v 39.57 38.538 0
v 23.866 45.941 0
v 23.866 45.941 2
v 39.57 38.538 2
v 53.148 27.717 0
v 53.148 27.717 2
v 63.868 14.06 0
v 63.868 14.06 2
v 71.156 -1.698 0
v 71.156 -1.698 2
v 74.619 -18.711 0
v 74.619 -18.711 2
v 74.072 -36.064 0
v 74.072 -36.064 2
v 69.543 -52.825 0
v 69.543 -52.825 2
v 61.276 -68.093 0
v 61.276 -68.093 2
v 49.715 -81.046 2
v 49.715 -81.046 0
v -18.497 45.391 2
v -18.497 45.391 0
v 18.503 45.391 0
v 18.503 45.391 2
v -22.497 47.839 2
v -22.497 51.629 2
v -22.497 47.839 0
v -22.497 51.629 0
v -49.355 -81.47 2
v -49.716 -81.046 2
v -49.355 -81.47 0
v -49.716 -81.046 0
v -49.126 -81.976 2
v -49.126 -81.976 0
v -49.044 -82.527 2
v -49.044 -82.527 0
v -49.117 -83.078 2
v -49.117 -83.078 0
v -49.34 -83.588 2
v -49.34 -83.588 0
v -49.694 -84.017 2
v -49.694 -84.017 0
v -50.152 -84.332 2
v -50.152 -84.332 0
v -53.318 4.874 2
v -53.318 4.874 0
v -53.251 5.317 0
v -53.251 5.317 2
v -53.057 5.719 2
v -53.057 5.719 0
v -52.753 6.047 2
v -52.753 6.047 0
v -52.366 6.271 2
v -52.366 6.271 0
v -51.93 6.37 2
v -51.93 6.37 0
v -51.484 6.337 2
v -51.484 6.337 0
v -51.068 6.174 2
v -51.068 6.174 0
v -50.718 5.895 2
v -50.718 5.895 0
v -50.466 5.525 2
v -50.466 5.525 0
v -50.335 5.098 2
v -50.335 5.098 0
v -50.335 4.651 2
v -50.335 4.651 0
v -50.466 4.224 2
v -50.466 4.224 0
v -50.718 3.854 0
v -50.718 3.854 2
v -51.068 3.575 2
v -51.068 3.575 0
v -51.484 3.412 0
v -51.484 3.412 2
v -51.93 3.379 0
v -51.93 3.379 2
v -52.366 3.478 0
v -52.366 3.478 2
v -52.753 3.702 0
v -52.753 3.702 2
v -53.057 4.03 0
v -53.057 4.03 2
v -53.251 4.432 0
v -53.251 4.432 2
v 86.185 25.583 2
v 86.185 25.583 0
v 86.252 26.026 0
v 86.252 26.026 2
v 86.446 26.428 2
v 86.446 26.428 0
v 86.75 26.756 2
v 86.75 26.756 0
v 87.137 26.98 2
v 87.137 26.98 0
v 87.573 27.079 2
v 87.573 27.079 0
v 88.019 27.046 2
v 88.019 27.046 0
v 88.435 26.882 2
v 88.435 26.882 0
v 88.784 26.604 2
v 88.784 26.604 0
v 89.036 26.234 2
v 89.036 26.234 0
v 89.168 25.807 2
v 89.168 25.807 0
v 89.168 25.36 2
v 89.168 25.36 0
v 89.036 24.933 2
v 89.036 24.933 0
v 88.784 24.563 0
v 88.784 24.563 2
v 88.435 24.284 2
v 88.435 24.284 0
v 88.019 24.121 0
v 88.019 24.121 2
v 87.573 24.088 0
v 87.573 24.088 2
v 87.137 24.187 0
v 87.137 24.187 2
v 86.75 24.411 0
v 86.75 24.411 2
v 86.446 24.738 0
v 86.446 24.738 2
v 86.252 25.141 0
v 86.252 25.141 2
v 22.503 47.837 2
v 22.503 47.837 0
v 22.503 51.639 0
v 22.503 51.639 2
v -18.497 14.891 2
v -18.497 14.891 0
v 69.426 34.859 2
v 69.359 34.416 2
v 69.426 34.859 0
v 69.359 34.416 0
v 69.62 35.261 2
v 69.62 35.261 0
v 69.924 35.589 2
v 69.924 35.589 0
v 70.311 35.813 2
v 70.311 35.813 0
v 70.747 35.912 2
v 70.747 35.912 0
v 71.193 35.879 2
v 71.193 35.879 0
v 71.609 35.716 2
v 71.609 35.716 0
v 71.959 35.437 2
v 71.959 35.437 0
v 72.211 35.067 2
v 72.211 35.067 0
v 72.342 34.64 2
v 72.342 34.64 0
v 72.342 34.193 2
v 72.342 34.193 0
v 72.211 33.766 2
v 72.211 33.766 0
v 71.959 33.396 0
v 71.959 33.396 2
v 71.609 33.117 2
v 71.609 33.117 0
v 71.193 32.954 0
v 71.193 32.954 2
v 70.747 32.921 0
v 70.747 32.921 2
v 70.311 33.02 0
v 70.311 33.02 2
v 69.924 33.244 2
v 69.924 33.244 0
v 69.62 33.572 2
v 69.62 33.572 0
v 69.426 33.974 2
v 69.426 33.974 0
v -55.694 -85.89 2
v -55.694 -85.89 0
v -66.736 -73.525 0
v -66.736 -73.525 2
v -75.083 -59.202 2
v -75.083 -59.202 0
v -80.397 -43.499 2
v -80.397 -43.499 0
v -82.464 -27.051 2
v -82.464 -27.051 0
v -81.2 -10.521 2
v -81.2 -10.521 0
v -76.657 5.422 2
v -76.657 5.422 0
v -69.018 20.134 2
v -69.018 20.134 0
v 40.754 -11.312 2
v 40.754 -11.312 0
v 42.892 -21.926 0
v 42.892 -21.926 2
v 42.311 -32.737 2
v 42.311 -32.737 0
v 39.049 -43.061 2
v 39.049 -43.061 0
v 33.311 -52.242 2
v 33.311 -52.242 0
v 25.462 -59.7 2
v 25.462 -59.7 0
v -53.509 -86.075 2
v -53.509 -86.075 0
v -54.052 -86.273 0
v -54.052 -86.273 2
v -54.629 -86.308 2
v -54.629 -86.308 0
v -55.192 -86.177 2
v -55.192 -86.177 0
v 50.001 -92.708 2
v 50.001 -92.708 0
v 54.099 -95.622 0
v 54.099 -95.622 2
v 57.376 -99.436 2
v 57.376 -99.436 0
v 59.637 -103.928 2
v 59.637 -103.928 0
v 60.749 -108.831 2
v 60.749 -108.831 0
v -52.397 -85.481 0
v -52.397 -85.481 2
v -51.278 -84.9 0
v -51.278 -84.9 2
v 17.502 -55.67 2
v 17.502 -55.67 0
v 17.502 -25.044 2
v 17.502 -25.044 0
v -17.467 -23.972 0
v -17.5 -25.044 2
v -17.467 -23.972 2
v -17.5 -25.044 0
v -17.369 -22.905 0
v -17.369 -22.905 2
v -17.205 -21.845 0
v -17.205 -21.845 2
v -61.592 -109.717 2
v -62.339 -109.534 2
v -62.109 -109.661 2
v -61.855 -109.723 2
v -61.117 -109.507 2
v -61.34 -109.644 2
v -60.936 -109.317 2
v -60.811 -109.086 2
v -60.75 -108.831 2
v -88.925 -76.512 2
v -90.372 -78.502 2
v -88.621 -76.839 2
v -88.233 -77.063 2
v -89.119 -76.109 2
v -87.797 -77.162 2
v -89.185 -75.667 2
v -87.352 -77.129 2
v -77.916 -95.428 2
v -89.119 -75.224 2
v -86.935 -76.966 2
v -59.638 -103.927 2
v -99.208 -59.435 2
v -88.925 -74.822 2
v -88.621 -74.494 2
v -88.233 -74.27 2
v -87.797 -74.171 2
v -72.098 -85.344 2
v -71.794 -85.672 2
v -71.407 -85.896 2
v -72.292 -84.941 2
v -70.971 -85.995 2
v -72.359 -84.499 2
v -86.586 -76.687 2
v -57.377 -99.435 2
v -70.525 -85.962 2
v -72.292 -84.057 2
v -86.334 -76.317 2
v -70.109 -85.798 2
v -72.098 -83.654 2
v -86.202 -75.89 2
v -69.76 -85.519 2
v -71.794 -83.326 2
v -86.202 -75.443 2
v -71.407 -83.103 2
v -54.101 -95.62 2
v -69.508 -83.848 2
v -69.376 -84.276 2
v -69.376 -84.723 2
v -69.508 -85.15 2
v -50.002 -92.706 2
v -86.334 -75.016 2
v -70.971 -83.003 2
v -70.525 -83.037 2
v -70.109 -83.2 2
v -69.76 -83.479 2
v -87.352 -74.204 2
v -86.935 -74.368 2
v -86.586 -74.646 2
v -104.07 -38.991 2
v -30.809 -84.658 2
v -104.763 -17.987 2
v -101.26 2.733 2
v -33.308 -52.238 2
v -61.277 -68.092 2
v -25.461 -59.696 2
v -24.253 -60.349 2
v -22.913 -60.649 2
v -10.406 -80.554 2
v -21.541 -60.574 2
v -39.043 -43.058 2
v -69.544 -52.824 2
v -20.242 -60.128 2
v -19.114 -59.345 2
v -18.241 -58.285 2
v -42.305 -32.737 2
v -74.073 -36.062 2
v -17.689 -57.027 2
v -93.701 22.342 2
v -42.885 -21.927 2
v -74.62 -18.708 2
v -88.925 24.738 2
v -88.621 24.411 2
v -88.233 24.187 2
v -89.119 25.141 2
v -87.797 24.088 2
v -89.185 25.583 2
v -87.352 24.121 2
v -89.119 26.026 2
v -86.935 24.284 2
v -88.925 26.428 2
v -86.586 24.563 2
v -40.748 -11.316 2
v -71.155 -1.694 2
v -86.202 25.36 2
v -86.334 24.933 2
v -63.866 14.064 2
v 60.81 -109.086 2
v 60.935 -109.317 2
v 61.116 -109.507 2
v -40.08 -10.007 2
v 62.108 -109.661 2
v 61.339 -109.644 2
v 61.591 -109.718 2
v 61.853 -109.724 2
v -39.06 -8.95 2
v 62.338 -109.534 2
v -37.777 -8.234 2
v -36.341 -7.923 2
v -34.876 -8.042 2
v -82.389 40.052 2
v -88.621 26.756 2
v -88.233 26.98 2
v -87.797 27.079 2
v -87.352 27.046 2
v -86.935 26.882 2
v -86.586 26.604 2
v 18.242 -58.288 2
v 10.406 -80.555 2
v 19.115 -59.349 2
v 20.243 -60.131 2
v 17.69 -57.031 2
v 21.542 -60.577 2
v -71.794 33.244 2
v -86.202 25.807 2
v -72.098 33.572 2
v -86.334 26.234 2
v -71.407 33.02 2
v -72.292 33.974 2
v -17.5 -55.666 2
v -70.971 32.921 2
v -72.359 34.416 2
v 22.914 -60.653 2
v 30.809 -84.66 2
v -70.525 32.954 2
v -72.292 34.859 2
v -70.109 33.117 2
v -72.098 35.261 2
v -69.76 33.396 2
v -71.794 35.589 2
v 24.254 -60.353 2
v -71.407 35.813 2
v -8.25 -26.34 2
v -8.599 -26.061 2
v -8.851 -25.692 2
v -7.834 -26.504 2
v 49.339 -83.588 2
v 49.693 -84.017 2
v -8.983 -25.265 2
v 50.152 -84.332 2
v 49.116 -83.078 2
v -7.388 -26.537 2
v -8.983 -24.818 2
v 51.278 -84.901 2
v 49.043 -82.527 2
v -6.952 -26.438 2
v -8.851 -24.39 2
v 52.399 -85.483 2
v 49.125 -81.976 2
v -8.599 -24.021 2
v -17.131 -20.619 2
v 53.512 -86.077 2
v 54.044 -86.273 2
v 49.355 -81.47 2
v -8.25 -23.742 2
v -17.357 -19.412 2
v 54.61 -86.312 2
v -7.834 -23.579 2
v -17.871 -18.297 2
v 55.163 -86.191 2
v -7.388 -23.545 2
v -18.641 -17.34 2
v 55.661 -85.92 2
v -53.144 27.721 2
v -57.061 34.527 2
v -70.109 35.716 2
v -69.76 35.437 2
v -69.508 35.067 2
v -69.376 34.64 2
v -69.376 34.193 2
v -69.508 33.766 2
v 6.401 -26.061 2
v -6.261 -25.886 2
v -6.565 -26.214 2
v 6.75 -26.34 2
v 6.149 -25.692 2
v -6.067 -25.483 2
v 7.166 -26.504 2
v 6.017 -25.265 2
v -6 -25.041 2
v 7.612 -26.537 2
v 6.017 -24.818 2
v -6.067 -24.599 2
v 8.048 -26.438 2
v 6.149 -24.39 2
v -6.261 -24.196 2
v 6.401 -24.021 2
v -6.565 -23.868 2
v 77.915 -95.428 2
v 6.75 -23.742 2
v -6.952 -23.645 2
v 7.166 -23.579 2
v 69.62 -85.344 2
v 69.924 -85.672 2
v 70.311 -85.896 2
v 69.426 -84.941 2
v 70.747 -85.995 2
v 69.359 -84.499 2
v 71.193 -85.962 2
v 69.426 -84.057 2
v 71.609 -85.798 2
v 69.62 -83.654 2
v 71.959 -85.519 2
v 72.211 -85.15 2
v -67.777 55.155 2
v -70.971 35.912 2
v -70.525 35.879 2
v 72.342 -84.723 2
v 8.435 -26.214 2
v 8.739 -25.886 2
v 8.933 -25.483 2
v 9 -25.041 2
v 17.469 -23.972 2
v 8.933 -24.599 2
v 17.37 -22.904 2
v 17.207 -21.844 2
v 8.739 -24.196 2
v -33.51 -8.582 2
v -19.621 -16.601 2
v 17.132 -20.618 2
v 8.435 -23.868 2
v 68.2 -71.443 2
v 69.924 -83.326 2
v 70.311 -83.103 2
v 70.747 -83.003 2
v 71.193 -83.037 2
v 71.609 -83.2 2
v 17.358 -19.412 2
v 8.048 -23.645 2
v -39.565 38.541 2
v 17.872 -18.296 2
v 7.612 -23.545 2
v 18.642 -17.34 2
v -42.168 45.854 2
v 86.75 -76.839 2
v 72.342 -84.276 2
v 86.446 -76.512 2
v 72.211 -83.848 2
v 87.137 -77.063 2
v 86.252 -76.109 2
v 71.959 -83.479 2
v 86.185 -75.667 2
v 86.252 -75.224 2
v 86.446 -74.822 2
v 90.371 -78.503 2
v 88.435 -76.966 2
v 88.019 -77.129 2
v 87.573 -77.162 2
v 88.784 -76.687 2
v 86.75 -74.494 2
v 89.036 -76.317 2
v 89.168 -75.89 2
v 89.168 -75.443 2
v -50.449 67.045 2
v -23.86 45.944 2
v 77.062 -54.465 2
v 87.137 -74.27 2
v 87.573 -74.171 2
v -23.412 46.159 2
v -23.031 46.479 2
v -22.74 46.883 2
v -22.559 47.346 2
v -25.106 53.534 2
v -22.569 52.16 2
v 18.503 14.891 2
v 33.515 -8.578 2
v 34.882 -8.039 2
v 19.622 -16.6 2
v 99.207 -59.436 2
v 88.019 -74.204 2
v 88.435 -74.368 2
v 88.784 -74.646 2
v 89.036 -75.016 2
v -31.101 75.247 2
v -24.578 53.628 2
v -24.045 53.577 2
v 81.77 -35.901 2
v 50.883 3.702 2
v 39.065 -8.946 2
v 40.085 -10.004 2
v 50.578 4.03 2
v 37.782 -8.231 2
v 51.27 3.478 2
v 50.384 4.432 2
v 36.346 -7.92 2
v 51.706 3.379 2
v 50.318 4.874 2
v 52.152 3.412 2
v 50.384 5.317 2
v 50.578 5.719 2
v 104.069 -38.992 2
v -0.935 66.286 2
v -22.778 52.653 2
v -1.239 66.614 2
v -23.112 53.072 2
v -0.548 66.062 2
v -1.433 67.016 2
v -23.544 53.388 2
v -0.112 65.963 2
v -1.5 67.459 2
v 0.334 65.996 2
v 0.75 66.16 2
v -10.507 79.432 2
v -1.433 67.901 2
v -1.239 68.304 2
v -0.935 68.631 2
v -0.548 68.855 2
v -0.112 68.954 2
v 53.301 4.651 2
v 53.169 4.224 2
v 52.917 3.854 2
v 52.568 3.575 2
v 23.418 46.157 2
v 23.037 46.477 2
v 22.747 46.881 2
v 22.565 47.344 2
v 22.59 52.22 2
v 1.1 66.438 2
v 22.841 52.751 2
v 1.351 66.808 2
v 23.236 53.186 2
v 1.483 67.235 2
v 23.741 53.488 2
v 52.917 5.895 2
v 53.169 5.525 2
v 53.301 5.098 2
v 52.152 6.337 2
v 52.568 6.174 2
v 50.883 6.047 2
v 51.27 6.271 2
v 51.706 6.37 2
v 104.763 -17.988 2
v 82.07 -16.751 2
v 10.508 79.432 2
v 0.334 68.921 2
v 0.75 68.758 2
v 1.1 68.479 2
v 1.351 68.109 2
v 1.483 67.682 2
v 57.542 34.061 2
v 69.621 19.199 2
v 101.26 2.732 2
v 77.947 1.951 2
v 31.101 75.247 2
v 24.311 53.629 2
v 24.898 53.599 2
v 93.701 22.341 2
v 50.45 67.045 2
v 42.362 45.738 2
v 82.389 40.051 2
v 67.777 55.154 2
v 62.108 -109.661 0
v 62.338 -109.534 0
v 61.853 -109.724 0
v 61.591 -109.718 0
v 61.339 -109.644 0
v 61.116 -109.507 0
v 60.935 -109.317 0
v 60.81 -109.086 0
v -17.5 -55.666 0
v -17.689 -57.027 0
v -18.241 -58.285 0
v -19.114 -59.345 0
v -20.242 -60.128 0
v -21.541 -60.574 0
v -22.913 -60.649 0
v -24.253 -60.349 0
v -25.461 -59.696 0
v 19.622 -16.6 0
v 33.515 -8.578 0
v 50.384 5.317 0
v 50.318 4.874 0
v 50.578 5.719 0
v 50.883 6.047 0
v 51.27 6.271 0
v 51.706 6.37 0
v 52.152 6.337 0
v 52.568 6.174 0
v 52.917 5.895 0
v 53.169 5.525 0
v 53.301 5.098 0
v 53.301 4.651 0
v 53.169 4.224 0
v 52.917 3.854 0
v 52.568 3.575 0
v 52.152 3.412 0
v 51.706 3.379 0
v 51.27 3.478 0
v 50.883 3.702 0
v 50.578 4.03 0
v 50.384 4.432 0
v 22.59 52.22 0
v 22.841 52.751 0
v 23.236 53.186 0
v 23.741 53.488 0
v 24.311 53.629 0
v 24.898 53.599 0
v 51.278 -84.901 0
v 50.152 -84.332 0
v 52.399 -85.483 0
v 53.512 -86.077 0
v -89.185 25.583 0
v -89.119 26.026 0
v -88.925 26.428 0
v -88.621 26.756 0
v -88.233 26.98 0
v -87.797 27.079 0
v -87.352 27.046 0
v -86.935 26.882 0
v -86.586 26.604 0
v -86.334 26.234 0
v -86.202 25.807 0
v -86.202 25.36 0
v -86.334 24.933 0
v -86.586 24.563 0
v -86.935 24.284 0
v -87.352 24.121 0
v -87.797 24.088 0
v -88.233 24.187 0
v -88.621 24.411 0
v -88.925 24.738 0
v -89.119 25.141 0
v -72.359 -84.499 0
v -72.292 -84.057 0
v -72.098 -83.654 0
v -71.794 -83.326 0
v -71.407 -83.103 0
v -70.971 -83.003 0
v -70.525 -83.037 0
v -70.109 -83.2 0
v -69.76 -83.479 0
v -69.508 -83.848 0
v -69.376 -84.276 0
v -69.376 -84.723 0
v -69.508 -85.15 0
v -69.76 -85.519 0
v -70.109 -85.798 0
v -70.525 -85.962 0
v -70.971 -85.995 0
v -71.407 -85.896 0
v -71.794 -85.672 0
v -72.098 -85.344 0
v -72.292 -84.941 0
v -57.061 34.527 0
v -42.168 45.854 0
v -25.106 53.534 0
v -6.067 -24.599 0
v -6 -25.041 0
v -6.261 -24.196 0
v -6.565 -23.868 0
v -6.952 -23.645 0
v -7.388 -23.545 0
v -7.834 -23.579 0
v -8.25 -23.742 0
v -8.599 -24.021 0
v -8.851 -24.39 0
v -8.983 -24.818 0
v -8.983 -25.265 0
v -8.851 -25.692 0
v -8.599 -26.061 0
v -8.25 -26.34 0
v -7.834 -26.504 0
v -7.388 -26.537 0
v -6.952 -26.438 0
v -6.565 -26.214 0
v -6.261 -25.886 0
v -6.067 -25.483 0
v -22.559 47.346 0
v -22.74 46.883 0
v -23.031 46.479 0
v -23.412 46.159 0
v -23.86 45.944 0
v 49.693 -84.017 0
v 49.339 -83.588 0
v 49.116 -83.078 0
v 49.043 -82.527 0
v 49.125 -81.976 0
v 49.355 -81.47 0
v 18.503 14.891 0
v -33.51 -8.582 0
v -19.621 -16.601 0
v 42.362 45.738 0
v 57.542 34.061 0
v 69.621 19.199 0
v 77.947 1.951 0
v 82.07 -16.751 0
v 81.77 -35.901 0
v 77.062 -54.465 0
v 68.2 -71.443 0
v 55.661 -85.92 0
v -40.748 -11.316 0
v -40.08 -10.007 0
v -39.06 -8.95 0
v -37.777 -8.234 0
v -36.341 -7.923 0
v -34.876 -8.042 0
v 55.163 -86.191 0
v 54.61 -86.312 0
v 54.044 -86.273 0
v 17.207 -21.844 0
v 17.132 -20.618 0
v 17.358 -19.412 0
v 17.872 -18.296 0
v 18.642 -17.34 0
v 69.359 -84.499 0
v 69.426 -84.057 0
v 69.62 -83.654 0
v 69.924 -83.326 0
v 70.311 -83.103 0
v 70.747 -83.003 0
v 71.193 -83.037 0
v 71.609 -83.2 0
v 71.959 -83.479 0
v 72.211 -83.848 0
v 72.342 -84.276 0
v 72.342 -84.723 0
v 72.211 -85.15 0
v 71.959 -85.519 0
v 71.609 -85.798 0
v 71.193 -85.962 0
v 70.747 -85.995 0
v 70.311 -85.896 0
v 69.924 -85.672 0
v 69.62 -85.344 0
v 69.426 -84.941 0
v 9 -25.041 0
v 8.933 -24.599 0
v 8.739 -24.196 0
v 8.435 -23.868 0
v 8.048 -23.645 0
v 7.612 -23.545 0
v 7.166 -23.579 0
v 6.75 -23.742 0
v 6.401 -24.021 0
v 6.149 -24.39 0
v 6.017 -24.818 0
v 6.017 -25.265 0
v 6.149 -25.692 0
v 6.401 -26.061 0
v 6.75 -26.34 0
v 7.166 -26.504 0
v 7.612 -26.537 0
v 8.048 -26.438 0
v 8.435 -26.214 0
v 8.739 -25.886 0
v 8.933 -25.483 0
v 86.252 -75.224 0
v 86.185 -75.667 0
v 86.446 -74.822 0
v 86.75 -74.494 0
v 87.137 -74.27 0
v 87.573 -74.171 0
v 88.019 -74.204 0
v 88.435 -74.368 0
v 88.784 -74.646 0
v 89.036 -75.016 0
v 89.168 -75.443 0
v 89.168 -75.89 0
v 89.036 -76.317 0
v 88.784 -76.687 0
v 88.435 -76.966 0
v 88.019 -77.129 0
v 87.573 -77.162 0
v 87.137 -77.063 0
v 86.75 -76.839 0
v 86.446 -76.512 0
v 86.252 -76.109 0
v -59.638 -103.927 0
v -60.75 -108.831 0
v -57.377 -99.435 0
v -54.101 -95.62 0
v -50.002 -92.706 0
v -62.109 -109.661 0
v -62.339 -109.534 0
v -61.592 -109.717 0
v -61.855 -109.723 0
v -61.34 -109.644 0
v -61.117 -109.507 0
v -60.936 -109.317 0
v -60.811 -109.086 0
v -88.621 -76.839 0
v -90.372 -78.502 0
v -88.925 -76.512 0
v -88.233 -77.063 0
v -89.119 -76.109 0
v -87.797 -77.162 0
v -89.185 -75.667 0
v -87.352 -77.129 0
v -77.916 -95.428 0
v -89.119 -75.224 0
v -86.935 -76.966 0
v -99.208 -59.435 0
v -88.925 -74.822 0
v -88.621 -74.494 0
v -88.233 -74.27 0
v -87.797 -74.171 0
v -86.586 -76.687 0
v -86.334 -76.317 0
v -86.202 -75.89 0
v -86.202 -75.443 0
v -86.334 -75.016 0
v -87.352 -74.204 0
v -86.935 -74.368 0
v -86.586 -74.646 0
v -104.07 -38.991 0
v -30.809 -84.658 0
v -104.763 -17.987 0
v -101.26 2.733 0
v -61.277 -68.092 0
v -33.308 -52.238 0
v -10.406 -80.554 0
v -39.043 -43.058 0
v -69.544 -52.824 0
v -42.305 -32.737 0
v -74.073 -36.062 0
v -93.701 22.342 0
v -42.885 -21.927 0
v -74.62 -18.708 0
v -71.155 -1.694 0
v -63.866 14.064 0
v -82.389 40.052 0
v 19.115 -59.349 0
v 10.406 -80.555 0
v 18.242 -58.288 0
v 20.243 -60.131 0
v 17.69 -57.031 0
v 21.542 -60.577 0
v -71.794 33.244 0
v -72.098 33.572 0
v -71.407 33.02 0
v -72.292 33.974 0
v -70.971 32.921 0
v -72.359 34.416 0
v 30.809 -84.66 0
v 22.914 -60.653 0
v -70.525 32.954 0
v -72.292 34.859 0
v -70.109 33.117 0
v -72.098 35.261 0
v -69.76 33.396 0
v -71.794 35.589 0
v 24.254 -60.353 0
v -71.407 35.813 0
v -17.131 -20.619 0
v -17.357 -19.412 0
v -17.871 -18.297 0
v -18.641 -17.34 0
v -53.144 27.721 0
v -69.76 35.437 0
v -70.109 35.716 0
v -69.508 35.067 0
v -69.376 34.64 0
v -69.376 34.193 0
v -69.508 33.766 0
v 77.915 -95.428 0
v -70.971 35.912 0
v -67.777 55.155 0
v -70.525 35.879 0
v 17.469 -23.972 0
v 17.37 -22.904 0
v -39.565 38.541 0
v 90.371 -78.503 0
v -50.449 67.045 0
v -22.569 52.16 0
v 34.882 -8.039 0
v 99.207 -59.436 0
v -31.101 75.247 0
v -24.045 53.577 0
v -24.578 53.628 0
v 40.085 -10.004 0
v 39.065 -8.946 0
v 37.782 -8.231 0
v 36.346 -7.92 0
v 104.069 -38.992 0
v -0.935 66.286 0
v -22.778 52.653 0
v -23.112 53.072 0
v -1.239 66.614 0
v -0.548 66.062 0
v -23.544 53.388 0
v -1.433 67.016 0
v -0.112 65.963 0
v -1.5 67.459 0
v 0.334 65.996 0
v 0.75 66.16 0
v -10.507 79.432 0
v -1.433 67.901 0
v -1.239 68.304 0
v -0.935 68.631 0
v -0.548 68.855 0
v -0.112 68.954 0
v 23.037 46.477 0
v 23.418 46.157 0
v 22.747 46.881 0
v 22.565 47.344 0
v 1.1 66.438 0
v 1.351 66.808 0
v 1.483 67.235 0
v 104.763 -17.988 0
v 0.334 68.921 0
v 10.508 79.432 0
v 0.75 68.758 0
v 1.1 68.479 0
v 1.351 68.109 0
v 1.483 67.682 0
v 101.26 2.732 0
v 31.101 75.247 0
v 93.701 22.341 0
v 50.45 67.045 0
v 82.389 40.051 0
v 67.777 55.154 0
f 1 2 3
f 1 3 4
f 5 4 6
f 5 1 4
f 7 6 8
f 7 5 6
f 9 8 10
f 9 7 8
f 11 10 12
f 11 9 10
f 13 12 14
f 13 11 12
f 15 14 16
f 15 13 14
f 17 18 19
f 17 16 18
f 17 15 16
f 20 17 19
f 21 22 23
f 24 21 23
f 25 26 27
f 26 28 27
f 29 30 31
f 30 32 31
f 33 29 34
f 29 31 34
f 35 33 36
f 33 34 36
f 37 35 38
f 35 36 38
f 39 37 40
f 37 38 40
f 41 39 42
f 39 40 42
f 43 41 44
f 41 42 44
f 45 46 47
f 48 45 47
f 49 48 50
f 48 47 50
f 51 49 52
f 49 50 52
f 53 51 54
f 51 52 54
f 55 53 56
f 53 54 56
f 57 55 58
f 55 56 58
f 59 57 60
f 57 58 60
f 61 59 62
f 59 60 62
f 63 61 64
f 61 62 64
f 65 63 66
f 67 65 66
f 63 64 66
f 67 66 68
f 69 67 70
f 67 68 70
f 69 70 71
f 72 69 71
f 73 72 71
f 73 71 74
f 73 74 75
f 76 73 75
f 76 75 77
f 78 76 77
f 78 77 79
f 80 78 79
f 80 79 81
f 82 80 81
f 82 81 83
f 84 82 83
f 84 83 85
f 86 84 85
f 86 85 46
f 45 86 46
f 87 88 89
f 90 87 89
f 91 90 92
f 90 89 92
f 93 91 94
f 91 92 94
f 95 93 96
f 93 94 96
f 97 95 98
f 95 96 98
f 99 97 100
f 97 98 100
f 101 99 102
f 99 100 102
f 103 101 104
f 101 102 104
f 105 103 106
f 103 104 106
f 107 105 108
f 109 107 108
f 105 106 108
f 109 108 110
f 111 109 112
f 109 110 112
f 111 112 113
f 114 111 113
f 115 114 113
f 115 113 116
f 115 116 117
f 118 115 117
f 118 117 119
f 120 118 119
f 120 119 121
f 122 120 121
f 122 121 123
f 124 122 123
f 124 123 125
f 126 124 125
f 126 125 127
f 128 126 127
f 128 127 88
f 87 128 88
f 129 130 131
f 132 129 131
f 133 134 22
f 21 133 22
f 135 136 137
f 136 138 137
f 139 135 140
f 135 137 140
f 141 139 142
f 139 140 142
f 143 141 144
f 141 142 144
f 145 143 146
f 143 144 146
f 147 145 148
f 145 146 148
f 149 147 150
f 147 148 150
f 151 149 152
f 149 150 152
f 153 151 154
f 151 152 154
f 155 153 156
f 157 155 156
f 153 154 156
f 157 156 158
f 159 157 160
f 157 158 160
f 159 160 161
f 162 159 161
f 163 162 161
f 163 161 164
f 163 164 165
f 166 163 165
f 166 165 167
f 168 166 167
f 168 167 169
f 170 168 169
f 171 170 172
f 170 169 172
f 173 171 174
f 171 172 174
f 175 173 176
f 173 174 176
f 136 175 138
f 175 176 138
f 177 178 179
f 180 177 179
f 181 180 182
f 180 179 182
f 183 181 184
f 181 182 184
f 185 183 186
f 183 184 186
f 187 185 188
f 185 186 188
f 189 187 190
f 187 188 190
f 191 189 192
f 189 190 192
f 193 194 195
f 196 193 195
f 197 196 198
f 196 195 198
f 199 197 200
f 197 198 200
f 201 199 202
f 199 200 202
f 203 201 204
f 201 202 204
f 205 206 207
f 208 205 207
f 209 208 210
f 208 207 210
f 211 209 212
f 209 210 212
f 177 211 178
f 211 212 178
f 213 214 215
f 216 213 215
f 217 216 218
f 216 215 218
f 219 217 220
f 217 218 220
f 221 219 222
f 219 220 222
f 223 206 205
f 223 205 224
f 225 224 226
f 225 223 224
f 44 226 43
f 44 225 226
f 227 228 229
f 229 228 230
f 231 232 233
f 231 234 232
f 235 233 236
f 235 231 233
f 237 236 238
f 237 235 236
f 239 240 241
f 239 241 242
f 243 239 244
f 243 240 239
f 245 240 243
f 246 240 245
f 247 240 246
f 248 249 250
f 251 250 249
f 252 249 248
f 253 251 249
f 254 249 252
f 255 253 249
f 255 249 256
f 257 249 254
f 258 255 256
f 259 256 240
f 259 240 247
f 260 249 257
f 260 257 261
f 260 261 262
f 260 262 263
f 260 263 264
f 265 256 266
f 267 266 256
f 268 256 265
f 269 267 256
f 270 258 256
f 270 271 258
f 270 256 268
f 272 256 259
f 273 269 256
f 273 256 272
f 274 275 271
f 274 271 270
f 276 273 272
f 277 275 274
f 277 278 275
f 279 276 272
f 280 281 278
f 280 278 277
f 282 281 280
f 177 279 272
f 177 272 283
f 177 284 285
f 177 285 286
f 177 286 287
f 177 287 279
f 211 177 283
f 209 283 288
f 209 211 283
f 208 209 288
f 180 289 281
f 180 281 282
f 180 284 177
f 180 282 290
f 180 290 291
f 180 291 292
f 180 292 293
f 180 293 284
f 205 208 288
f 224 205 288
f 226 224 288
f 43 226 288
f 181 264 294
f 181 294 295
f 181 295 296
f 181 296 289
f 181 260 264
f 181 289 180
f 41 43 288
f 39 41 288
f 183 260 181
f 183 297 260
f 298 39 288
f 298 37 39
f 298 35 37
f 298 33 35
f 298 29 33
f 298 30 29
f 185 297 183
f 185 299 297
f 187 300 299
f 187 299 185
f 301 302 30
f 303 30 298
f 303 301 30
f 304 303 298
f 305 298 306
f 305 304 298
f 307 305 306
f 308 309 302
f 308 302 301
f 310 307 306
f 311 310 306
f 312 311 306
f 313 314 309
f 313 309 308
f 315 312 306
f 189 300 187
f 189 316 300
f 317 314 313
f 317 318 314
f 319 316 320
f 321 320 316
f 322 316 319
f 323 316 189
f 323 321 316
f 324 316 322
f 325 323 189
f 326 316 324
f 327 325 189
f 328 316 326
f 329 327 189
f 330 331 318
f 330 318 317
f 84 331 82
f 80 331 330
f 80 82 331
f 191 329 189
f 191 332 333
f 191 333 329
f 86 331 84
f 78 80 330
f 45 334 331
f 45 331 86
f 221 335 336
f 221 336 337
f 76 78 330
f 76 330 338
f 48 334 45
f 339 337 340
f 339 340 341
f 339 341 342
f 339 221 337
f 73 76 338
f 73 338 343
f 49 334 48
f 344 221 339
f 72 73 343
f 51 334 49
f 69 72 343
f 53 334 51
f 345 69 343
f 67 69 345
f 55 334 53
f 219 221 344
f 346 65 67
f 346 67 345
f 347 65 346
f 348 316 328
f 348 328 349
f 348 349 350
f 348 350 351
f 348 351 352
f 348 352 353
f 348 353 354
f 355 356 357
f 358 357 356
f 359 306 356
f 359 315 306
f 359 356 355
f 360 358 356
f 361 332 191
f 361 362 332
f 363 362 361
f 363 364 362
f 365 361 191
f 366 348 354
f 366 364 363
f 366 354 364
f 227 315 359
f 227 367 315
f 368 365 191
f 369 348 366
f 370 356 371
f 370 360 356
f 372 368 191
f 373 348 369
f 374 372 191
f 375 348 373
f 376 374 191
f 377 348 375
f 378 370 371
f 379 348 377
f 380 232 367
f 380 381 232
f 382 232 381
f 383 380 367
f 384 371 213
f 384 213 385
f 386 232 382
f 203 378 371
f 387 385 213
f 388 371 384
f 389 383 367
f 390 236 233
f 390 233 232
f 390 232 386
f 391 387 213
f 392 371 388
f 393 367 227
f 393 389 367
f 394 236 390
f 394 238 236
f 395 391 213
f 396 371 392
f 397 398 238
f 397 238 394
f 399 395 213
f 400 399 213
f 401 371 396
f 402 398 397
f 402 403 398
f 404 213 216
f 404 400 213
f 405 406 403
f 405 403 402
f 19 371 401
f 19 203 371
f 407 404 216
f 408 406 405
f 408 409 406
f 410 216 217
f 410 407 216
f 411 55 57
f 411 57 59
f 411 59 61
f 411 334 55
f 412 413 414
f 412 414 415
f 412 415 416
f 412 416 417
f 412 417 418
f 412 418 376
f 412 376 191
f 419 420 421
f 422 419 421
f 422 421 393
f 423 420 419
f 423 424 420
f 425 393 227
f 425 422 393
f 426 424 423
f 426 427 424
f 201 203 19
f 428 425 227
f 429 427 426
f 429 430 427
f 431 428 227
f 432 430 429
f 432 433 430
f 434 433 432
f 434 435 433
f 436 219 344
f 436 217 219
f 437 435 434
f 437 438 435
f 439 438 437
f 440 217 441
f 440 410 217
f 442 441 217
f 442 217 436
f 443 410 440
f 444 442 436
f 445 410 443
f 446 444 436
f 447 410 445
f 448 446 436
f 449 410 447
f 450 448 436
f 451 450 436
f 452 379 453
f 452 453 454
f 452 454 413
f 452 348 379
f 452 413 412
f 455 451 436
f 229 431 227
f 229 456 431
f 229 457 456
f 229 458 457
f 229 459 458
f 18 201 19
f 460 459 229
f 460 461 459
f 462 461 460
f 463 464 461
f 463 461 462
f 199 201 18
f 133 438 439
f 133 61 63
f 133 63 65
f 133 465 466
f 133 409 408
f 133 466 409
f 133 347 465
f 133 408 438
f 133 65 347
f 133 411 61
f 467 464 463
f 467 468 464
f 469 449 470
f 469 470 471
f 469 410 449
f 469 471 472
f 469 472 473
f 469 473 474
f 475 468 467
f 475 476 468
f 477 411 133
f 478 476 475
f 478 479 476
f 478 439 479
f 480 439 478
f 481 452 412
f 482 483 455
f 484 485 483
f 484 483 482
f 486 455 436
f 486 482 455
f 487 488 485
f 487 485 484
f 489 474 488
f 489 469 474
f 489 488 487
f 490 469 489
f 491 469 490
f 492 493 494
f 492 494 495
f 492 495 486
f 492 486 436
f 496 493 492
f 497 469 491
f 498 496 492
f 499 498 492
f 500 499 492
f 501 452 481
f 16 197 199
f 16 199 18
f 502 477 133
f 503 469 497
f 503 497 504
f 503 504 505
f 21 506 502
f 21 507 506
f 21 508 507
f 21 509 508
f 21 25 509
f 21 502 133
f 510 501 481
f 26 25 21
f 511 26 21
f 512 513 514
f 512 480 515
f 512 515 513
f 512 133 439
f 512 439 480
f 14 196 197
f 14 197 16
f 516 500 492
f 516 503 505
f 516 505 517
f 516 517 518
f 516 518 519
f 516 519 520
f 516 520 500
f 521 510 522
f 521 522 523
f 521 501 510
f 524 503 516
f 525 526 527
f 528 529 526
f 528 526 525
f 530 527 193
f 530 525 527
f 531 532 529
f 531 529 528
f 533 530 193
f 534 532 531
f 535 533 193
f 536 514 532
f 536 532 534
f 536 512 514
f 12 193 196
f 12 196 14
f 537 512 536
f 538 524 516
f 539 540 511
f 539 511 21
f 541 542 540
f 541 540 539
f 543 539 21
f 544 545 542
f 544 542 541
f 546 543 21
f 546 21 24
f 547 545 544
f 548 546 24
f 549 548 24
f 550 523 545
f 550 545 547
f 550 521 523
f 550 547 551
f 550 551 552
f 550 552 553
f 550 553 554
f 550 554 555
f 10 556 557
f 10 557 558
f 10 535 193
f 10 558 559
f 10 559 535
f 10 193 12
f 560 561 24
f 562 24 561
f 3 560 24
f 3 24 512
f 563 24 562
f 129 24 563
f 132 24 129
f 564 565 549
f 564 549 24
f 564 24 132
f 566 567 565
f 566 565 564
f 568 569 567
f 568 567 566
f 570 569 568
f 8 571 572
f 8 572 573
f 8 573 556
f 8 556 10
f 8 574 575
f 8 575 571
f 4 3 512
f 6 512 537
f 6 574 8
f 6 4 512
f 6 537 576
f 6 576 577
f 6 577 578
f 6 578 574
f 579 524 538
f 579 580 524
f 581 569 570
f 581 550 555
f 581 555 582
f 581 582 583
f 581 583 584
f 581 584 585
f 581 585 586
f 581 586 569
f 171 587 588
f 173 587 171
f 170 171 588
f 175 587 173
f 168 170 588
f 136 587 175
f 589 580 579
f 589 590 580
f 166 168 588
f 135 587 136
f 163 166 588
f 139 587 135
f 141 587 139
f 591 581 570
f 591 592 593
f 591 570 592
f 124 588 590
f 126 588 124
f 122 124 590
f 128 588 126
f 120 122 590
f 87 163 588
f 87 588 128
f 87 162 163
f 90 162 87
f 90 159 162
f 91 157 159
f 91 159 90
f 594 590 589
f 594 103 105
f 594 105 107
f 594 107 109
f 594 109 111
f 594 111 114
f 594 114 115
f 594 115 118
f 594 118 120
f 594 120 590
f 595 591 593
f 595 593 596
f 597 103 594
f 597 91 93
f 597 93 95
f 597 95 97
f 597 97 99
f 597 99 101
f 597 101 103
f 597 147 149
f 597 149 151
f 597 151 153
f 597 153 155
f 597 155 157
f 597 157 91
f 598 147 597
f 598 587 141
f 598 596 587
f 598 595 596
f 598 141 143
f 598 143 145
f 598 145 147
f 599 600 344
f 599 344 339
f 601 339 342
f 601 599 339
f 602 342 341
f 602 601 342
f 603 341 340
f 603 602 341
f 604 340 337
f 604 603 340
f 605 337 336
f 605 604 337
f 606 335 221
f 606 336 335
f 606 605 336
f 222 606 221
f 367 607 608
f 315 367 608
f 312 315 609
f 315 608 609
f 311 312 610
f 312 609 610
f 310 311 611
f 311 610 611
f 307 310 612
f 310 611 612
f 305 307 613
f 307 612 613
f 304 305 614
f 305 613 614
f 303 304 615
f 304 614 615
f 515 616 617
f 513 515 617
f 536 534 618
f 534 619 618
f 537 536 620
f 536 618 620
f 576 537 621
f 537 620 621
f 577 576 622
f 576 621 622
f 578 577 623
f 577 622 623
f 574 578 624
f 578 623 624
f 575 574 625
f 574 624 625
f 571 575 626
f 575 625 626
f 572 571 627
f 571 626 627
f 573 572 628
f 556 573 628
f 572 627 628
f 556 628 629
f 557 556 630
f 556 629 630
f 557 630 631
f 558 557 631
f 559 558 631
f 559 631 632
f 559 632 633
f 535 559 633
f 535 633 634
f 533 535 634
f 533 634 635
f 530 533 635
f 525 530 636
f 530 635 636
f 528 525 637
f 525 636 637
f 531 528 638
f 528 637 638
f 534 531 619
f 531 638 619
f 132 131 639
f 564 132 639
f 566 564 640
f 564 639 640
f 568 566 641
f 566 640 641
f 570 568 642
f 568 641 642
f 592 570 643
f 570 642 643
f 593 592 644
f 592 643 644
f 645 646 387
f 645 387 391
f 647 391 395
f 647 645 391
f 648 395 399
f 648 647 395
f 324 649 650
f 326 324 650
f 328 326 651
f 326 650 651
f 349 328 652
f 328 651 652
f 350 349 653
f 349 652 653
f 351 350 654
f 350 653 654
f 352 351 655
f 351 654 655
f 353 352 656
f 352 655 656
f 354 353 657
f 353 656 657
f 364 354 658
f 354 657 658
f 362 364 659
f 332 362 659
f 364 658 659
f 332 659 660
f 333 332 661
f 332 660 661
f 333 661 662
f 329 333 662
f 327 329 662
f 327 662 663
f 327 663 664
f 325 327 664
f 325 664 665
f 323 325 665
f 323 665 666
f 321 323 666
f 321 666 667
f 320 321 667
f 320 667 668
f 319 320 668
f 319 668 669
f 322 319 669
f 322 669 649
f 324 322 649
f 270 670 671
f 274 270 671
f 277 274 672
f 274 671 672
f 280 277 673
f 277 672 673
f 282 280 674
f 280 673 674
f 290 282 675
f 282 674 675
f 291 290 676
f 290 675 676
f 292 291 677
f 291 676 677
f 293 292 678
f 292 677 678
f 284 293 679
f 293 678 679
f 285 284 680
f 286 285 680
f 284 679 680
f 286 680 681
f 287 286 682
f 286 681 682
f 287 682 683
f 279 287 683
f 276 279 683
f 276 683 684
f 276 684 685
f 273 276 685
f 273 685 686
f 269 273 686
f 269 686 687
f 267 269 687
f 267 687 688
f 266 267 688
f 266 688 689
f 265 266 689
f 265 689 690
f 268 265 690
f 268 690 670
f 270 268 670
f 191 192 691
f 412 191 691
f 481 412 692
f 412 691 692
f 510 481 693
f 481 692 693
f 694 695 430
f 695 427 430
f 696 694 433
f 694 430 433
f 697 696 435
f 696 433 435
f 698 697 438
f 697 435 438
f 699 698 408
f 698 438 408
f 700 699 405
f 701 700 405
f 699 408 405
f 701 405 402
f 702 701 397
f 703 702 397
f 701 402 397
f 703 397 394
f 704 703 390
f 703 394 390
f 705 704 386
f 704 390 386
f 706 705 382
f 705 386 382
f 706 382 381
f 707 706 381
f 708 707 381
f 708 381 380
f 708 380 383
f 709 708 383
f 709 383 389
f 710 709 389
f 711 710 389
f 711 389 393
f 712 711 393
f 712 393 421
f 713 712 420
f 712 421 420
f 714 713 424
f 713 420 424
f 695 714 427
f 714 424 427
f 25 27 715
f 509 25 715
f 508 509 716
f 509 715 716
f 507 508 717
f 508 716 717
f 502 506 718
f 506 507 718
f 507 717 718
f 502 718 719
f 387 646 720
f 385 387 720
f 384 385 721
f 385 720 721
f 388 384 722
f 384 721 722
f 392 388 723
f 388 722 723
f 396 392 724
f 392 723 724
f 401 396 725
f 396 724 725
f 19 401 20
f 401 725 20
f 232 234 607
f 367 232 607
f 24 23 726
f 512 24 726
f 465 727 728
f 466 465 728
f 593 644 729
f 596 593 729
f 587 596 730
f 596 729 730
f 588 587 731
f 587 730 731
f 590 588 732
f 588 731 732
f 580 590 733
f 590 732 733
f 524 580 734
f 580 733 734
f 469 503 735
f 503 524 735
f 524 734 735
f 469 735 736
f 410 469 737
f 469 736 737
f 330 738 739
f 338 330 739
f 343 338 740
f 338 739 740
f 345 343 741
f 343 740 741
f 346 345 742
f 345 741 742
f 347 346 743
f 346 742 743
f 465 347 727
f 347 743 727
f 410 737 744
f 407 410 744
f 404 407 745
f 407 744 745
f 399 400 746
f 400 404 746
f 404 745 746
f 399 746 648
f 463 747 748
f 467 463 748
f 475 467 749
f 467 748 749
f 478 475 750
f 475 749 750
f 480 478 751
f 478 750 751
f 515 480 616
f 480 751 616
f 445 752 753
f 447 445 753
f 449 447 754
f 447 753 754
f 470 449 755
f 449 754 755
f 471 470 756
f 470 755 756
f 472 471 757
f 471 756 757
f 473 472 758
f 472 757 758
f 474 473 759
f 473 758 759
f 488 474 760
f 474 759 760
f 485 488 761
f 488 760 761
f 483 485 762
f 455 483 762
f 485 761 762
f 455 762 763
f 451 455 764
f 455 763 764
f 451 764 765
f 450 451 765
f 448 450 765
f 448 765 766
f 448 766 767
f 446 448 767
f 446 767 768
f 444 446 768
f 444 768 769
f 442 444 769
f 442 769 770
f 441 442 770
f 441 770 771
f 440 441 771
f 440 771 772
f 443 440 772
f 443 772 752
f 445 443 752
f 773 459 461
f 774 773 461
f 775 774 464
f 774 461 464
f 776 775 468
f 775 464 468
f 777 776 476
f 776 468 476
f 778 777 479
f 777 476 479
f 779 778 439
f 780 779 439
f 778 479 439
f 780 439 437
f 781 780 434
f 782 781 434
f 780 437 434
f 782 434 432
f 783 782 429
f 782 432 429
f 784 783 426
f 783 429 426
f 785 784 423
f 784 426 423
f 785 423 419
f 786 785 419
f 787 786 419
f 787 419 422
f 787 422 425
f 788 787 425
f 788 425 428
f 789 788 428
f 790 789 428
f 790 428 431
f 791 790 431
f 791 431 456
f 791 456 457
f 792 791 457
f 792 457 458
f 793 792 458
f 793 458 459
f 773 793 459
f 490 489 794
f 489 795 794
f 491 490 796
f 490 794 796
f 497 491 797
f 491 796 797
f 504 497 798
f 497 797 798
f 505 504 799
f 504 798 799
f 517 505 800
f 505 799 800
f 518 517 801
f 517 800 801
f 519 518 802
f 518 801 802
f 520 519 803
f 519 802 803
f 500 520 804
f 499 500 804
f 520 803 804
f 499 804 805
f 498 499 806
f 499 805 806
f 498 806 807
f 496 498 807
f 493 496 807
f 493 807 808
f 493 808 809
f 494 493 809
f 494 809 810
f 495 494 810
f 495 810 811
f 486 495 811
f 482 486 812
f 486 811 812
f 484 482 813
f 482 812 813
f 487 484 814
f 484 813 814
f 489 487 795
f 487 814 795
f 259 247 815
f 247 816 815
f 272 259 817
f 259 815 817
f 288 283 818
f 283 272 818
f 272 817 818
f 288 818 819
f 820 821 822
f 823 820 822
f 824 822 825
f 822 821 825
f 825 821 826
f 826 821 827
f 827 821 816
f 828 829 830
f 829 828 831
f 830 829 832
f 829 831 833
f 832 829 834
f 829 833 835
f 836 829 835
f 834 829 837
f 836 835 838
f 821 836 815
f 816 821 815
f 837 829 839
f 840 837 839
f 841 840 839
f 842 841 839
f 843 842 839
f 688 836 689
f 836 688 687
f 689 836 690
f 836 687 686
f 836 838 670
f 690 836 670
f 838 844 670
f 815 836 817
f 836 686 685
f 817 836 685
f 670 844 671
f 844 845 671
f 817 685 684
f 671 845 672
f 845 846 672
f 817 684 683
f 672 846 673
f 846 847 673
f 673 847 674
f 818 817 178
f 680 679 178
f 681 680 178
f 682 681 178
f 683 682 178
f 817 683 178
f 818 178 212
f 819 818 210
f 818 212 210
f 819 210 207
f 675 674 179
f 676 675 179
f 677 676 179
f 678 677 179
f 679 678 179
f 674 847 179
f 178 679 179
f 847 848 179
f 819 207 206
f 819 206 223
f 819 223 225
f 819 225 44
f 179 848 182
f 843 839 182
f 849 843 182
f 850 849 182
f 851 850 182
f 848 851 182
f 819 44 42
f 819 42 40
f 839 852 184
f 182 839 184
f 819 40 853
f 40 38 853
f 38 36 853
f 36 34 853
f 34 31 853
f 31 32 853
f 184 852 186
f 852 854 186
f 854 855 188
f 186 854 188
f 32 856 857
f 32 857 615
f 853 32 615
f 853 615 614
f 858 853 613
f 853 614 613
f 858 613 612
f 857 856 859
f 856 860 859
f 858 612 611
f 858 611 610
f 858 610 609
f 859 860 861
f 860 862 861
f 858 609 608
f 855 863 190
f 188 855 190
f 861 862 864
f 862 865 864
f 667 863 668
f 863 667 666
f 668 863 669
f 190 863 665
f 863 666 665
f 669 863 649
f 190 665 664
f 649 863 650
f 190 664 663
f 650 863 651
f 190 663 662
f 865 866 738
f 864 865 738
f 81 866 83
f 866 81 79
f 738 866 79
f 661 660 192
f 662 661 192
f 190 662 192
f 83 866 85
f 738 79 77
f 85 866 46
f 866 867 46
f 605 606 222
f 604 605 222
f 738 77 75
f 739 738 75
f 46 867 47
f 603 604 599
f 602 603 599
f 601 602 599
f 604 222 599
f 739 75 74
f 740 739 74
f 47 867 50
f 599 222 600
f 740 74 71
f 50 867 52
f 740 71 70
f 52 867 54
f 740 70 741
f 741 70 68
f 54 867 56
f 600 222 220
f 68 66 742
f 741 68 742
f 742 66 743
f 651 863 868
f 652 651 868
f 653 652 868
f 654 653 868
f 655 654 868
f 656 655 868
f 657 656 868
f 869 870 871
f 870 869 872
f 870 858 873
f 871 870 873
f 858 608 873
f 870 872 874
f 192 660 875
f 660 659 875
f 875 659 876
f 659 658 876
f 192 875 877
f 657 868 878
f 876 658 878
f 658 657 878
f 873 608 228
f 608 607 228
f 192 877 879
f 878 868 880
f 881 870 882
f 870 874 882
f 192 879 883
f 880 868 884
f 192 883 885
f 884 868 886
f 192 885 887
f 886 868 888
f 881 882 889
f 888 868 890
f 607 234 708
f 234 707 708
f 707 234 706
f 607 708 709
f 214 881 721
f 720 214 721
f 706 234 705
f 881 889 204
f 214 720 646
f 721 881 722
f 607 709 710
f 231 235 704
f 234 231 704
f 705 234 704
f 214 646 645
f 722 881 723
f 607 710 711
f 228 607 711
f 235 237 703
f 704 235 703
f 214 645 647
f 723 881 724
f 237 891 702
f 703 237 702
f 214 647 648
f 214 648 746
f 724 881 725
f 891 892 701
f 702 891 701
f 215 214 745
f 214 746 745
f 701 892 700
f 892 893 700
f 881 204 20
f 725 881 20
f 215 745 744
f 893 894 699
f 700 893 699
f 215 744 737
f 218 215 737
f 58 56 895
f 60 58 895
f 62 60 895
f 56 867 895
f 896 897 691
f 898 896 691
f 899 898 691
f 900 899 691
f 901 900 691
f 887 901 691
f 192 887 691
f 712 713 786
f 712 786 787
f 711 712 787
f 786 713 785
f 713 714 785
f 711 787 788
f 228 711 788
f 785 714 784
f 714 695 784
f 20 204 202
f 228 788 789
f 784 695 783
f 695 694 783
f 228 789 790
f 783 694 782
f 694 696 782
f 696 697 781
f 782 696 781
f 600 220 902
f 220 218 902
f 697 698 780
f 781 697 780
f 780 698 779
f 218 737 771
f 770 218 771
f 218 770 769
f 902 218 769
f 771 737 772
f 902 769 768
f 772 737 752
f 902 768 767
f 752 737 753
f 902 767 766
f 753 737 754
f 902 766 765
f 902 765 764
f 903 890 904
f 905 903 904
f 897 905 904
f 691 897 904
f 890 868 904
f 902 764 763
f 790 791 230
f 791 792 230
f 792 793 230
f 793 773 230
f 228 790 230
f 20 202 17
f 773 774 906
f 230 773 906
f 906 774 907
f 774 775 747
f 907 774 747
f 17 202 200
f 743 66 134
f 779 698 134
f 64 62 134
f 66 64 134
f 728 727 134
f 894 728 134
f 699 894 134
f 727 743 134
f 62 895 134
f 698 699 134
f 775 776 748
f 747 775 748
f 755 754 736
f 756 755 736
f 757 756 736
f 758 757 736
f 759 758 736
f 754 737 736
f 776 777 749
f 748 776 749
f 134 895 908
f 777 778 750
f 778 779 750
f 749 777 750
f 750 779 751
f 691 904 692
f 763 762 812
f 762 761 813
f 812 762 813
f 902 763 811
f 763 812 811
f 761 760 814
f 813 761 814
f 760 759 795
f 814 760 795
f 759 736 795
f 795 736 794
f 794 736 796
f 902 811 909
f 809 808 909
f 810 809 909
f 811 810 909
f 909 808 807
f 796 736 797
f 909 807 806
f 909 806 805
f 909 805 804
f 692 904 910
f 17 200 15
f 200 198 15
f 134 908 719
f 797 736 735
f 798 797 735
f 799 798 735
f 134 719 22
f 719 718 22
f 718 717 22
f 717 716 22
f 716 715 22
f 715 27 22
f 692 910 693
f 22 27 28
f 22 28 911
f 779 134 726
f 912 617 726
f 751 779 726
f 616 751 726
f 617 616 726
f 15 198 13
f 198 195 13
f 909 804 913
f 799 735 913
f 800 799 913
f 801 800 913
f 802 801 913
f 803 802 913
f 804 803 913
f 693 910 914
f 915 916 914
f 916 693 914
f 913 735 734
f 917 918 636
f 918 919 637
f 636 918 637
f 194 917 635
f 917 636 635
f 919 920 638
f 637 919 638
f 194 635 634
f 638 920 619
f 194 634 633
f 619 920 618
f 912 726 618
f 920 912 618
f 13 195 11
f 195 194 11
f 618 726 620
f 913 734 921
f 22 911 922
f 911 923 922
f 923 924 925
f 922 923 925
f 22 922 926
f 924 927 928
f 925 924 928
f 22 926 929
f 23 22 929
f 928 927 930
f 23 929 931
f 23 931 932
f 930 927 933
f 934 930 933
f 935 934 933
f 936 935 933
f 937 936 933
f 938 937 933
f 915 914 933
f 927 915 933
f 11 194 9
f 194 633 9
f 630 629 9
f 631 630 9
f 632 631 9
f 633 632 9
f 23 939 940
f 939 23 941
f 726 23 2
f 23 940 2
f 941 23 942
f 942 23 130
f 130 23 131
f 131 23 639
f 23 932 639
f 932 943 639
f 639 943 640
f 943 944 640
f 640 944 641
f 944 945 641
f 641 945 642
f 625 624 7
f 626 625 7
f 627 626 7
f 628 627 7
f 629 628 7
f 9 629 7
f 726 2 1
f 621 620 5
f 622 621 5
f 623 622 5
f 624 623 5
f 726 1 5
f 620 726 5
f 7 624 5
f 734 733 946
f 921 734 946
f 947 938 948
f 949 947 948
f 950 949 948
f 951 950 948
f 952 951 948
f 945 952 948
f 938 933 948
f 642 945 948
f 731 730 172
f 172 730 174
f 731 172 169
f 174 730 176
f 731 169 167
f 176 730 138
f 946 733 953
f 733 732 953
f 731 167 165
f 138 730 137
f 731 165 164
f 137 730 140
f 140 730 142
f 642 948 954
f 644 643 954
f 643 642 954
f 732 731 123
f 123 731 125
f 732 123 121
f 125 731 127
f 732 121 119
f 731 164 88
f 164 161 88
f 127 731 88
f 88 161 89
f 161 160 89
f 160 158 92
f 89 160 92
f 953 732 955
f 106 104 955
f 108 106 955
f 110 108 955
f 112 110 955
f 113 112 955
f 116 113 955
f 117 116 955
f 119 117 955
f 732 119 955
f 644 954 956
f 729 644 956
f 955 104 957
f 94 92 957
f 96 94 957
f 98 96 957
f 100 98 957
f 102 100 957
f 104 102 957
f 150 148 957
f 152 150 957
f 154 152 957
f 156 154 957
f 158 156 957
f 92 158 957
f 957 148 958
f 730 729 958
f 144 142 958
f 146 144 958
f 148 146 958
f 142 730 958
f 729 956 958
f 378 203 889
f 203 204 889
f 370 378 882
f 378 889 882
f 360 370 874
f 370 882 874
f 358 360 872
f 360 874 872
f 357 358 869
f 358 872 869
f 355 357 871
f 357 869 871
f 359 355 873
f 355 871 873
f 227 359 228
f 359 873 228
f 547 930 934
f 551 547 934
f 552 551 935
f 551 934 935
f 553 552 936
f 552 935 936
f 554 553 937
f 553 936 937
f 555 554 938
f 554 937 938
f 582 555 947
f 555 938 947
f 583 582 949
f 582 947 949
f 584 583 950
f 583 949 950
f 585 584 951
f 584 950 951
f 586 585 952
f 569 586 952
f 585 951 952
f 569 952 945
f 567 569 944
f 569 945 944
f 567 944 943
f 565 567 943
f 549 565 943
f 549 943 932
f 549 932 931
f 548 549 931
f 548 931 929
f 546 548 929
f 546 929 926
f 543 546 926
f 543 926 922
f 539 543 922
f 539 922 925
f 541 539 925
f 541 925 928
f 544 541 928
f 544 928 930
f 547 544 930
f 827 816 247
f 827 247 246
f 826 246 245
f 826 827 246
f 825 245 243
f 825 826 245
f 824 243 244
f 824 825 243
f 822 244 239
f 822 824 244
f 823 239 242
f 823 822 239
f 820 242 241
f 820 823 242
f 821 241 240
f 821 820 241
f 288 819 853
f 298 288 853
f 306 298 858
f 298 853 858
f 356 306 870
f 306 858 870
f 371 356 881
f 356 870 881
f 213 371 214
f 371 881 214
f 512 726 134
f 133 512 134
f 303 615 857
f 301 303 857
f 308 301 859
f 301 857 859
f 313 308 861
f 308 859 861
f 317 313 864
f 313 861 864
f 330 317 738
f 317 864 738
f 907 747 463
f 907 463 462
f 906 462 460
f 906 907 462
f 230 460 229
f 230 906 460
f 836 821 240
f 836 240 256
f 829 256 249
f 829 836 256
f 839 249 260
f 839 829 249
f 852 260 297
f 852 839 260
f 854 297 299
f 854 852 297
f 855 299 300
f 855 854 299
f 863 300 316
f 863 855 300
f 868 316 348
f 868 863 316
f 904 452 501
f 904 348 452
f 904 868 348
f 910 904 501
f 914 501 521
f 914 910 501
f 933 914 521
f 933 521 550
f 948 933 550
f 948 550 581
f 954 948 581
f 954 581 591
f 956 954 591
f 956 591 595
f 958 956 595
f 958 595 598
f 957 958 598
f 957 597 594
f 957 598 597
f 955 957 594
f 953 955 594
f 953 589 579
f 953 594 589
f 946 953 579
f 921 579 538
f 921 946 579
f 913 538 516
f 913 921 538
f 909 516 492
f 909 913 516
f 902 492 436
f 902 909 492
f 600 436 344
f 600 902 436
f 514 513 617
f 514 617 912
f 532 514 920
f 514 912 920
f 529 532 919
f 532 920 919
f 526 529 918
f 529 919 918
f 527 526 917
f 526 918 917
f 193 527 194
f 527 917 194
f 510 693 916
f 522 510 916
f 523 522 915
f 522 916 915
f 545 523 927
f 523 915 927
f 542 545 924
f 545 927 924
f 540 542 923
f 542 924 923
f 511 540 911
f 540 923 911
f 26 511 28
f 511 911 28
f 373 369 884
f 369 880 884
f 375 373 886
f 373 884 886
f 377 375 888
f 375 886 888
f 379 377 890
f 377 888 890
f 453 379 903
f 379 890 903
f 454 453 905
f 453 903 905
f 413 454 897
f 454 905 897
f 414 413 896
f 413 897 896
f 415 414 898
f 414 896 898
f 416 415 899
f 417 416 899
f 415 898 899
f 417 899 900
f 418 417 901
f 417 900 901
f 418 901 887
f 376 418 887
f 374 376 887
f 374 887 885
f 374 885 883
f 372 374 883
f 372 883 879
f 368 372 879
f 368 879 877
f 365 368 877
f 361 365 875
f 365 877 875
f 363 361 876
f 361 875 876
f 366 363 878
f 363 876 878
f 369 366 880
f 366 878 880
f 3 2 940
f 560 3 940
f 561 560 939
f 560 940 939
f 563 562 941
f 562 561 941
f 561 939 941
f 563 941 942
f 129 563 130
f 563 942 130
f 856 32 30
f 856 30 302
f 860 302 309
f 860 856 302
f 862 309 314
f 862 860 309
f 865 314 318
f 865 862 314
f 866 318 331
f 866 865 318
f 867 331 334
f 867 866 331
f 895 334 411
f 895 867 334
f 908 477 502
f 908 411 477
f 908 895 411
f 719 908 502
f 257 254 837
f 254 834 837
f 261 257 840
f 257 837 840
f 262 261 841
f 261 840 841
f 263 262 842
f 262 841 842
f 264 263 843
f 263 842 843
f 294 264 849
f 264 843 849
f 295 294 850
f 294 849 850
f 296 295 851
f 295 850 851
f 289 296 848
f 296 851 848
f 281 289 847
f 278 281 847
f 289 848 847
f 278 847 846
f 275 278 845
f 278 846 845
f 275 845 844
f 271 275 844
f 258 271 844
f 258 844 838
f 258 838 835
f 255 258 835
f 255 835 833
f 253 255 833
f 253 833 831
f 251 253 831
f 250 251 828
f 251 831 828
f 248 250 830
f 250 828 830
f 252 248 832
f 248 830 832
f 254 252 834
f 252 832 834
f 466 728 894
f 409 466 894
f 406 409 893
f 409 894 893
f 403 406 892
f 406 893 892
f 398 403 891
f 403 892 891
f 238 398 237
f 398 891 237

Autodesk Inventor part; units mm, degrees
ref_plane "YZ Plane" through (0, 0, 0) normal (1, 0, 0) x (0, 1, 0)
ref_plane "XZ Plane" through (0, 0, 0) normal (0, 1, 0) x (-1, 0, 0)
ref_plane "XY Plane" through (0, 0, 0) normal (0, 0, 1) x (1, 0, 0)
sketch "Sketch1" plane through (0, 0, 0) normal (0, 0, 1) x (1, 0, 0)
  line L0 (18.5032, 45.3912) -> (18.5032, 14.8912) projected
  line L1 (18.5032, 14.8912) -> (-18.4968, 14.8912) projected
  line L2 (-18.4968, 14.8912) -> (-18.4968, 45.3912) projected
  line L3 (-18.4968, 45.3912) -> (18.5032, 45.3912) projected
  arc A0 (17.5017, -55.6702) -> (25.4619, -59.6998) centre (22.5017, -55.6702) ccw projected
  line L4 (17.5017, -55.6702) -> (17.5016, -25.0441) projected
  arc A1 (17.5016, -25.0441) -> (17.2066, -21.8442) centre (0.0033, -25.0441) ccw projected
  arc A2 (19.6222, -16.5997) -> (17.2066, -21.8442) centre (22.1222, -20.9298) ccw projected
  line L5 (19.6222, -16.5997) -> (33.5153, -8.5785) projected
  arc A3 (40.7535, -11.3119) -> (33.5153, -8.5785) centre (36.0153, -12.9086) ccw projected
  arc A4 (25.4619, -59.6998) -> (40.7535, -11.3119) centre (0.0033, -25.0441) ccw projected
  arc A5 (-17.2054, -21.8447) -> (-19.6211, -16.6006) centre (-22.1212, -20.9307) ccw projected
  arc A6 (-17.2054, -21.8447) -> (-17.5003, -25.0442) centre (0.0033, -25.0441) ccw projected
  line L6 (-17.5003, -25.0442) -> (-17.5003, -55.6665) projected
  arc A7 (-25.4611, -59.6955) -> (-17.5003, -55.6665) centre (-22.5003, -55.6665) ccw projected
  arc A8 (-40.7482, -11.3157) -> (-25.4611, -59.6955) centre (0.0033, -25.0441) ccw projected
  arc A9 (-33.5098, -8.5818) -> (-40.7482, -11.3157) centre (-36.0099, -12.9119) ccw projected
  line L7 (-33.5098, -8.5818) -> (-19.6211, -16.6006) projected
  line L8 (22.5032, 47.8371) -> (22.5032, 51.6387)
  arc A10 (25.1118, 53.5439) -> (22.5032, 51.6387) centre (24.5032, 51.6387) ccw
  arc A11 (-25.1056, 53.5343) -> (-69.0178, 20.1345) centre (0.0033, -25.0441) ccw projected
  arc A12 (-22.4968, 51.6291) -> (-25.1056, 53.5343) centre (-24.4968, 51.6291) ccw
  line L9 (-22.4968, 51.6291) -> (-22.4968, 47.8394)
  arc A13 (53.5122, -86.077) -> (55.8167, -85.7905) centre (54.4635, -84.3178) ccw
  arc A14 (53.5122, -86.077) -> (50.1516, -84.3322) centre (-0.0002, -185.037) ccw
  arc A15 (-50.1523, -84.3319) -> (-53.5093, -86.0748) centre (-0.0002, -185.037) ccw
  arc A16 (-55.8138, -85.7882) -> (-53.5093, -86.0748) centre (-54.4606, -84.3155) ccw
  arc A17 (-62.339, -109.5339) -> (-60.7504, -108.8306) centre (-61.7453, -108.7292) ccw projected
  arc A18 (-50.0022, -92.7062) -> (-60.7504, -108.8306) centre (-40.1313, -110.9304) ccw projected
  arc A19 (50.001, -92.7085) -> (-50.0022, -92.7062) centre (-0.0027, -185.0388) ccw projected
  arc A20 (60.7494, -108.8311) -> (50.001, -92.7085) centre (40.1315, -110.9322) ccw projected
  arc A21 (60.7494, -108.8311) -> (62.3379, -109.5344) centre (61.7442, -108.7297) ccw projected
  arc A22 (62.3379, -109.5344) -> (-62.339, -109.5339) centre (-0.0002, -25.0416) ccw projected
  arc A23 (49.7154, -81.0462) -> (23.8658, 45.9414) centre (-0.0002, -25.0416) ccw
  arc A24 (-23.8596, 45.9436) -> (-49.7161, -81.046) centre (-0.0002, -25.0416) ccw
  arc A25 (55.661, -85.9197) -> (24.8977, 53.5994) centre (-0.0002, -25.0416) ccw
  arc A26 (-25.052, 53.5506) -> (-55.6938, -85.89) centre (-0.0002, -25.0416) ccw
  arc A27 (-50.1523, -84.3319) -> (-49.7161, -81.046) centre (-51.0439, -82.5417) ccw
  arc A28 (49.7154, -81.0462) -> (50.1516, -84.3322) centre (51.0431, -82.5419) ccw
  arc A29 (22.5032, 47.8371) -> (23.8658, 45.9414) centre (24.5032, 47.8371) ccw
  arc A30 (-23.8596, 45.9436) -> (-22.4968, 47.8394) centre (-24.4968, 47.8394) ccw
  point P0 (0, 0)
  point P1 (22.5032, 46.385)
  point P2 (-22.4968, 46.3872)
  dimension "d31" = 2
extrude "Extrusion11" add sketch "Sketch1" along normal blind 2
ref_plane "Work Plane9" through (0, 0, 2) normal (0, 0, 1) x (1, 0, 0)
sketch "Sketch4" plane through (0, 0, 2) normal (0, 0, 1) x (1, 0, 0)
  circle A0 centre (0.0001, -25.0412) radius 10.8 projected
  line L0 (0.0001, -25.0412) -> (-7.4999, -25.0412) construction
  circle A1 centre (-7.4999, -25.0412) radius 1.5
  line L1 (0.0001, -25.0412) -> (7.5001, -25.0412) construction
  circle A2 centre (7.5001, -25.0412) radius 1.5
  point P0 (0, 0)
  dimension "d19" = 7.5
  dimension "d20" = 3
  dimension "d21" = 7.5
  dimension "d22" = 3
extrude "Extrusion7" cut sketch "Sketch4" against normal up to next contours A1 | A2
sketch "Sketch8" plane through (0, 0, 0) normal (0, 0, -1) x (-1, 0, 0)
  circle A0 centre (70.8591, 34.4165) radius 1.5
  circle A1 centre (87.6853, 25.5834) radius 1.5
  circle A2 centre (87.6853, -75.6666) radius 1.5
  circle A3 centre (70.8591, -84.4992) radius 1.5
  circle A4 centre (51.8178, 4.8745) radius 1.5
  circle A5 centre (0, 67.4586) radius 1.5
  circle A6 centre (-70.8591, 34.4165) radius 1.5
  circle A7 centre (-51.8178, 4.8745) radius 1.5
  circle A8 centre (-87.6849, 25.5834) radius 1.5
  circle A9 centre (-87.6849, -75.6666) radius 1.5
  circle A10 centre (-70.8591, -84.4992) radius 1.5
  point P0 (0, 0)
extrude "Extrusion12" cut sketch "Sketch8" against normal blind 2
properties part number "4th Board"
